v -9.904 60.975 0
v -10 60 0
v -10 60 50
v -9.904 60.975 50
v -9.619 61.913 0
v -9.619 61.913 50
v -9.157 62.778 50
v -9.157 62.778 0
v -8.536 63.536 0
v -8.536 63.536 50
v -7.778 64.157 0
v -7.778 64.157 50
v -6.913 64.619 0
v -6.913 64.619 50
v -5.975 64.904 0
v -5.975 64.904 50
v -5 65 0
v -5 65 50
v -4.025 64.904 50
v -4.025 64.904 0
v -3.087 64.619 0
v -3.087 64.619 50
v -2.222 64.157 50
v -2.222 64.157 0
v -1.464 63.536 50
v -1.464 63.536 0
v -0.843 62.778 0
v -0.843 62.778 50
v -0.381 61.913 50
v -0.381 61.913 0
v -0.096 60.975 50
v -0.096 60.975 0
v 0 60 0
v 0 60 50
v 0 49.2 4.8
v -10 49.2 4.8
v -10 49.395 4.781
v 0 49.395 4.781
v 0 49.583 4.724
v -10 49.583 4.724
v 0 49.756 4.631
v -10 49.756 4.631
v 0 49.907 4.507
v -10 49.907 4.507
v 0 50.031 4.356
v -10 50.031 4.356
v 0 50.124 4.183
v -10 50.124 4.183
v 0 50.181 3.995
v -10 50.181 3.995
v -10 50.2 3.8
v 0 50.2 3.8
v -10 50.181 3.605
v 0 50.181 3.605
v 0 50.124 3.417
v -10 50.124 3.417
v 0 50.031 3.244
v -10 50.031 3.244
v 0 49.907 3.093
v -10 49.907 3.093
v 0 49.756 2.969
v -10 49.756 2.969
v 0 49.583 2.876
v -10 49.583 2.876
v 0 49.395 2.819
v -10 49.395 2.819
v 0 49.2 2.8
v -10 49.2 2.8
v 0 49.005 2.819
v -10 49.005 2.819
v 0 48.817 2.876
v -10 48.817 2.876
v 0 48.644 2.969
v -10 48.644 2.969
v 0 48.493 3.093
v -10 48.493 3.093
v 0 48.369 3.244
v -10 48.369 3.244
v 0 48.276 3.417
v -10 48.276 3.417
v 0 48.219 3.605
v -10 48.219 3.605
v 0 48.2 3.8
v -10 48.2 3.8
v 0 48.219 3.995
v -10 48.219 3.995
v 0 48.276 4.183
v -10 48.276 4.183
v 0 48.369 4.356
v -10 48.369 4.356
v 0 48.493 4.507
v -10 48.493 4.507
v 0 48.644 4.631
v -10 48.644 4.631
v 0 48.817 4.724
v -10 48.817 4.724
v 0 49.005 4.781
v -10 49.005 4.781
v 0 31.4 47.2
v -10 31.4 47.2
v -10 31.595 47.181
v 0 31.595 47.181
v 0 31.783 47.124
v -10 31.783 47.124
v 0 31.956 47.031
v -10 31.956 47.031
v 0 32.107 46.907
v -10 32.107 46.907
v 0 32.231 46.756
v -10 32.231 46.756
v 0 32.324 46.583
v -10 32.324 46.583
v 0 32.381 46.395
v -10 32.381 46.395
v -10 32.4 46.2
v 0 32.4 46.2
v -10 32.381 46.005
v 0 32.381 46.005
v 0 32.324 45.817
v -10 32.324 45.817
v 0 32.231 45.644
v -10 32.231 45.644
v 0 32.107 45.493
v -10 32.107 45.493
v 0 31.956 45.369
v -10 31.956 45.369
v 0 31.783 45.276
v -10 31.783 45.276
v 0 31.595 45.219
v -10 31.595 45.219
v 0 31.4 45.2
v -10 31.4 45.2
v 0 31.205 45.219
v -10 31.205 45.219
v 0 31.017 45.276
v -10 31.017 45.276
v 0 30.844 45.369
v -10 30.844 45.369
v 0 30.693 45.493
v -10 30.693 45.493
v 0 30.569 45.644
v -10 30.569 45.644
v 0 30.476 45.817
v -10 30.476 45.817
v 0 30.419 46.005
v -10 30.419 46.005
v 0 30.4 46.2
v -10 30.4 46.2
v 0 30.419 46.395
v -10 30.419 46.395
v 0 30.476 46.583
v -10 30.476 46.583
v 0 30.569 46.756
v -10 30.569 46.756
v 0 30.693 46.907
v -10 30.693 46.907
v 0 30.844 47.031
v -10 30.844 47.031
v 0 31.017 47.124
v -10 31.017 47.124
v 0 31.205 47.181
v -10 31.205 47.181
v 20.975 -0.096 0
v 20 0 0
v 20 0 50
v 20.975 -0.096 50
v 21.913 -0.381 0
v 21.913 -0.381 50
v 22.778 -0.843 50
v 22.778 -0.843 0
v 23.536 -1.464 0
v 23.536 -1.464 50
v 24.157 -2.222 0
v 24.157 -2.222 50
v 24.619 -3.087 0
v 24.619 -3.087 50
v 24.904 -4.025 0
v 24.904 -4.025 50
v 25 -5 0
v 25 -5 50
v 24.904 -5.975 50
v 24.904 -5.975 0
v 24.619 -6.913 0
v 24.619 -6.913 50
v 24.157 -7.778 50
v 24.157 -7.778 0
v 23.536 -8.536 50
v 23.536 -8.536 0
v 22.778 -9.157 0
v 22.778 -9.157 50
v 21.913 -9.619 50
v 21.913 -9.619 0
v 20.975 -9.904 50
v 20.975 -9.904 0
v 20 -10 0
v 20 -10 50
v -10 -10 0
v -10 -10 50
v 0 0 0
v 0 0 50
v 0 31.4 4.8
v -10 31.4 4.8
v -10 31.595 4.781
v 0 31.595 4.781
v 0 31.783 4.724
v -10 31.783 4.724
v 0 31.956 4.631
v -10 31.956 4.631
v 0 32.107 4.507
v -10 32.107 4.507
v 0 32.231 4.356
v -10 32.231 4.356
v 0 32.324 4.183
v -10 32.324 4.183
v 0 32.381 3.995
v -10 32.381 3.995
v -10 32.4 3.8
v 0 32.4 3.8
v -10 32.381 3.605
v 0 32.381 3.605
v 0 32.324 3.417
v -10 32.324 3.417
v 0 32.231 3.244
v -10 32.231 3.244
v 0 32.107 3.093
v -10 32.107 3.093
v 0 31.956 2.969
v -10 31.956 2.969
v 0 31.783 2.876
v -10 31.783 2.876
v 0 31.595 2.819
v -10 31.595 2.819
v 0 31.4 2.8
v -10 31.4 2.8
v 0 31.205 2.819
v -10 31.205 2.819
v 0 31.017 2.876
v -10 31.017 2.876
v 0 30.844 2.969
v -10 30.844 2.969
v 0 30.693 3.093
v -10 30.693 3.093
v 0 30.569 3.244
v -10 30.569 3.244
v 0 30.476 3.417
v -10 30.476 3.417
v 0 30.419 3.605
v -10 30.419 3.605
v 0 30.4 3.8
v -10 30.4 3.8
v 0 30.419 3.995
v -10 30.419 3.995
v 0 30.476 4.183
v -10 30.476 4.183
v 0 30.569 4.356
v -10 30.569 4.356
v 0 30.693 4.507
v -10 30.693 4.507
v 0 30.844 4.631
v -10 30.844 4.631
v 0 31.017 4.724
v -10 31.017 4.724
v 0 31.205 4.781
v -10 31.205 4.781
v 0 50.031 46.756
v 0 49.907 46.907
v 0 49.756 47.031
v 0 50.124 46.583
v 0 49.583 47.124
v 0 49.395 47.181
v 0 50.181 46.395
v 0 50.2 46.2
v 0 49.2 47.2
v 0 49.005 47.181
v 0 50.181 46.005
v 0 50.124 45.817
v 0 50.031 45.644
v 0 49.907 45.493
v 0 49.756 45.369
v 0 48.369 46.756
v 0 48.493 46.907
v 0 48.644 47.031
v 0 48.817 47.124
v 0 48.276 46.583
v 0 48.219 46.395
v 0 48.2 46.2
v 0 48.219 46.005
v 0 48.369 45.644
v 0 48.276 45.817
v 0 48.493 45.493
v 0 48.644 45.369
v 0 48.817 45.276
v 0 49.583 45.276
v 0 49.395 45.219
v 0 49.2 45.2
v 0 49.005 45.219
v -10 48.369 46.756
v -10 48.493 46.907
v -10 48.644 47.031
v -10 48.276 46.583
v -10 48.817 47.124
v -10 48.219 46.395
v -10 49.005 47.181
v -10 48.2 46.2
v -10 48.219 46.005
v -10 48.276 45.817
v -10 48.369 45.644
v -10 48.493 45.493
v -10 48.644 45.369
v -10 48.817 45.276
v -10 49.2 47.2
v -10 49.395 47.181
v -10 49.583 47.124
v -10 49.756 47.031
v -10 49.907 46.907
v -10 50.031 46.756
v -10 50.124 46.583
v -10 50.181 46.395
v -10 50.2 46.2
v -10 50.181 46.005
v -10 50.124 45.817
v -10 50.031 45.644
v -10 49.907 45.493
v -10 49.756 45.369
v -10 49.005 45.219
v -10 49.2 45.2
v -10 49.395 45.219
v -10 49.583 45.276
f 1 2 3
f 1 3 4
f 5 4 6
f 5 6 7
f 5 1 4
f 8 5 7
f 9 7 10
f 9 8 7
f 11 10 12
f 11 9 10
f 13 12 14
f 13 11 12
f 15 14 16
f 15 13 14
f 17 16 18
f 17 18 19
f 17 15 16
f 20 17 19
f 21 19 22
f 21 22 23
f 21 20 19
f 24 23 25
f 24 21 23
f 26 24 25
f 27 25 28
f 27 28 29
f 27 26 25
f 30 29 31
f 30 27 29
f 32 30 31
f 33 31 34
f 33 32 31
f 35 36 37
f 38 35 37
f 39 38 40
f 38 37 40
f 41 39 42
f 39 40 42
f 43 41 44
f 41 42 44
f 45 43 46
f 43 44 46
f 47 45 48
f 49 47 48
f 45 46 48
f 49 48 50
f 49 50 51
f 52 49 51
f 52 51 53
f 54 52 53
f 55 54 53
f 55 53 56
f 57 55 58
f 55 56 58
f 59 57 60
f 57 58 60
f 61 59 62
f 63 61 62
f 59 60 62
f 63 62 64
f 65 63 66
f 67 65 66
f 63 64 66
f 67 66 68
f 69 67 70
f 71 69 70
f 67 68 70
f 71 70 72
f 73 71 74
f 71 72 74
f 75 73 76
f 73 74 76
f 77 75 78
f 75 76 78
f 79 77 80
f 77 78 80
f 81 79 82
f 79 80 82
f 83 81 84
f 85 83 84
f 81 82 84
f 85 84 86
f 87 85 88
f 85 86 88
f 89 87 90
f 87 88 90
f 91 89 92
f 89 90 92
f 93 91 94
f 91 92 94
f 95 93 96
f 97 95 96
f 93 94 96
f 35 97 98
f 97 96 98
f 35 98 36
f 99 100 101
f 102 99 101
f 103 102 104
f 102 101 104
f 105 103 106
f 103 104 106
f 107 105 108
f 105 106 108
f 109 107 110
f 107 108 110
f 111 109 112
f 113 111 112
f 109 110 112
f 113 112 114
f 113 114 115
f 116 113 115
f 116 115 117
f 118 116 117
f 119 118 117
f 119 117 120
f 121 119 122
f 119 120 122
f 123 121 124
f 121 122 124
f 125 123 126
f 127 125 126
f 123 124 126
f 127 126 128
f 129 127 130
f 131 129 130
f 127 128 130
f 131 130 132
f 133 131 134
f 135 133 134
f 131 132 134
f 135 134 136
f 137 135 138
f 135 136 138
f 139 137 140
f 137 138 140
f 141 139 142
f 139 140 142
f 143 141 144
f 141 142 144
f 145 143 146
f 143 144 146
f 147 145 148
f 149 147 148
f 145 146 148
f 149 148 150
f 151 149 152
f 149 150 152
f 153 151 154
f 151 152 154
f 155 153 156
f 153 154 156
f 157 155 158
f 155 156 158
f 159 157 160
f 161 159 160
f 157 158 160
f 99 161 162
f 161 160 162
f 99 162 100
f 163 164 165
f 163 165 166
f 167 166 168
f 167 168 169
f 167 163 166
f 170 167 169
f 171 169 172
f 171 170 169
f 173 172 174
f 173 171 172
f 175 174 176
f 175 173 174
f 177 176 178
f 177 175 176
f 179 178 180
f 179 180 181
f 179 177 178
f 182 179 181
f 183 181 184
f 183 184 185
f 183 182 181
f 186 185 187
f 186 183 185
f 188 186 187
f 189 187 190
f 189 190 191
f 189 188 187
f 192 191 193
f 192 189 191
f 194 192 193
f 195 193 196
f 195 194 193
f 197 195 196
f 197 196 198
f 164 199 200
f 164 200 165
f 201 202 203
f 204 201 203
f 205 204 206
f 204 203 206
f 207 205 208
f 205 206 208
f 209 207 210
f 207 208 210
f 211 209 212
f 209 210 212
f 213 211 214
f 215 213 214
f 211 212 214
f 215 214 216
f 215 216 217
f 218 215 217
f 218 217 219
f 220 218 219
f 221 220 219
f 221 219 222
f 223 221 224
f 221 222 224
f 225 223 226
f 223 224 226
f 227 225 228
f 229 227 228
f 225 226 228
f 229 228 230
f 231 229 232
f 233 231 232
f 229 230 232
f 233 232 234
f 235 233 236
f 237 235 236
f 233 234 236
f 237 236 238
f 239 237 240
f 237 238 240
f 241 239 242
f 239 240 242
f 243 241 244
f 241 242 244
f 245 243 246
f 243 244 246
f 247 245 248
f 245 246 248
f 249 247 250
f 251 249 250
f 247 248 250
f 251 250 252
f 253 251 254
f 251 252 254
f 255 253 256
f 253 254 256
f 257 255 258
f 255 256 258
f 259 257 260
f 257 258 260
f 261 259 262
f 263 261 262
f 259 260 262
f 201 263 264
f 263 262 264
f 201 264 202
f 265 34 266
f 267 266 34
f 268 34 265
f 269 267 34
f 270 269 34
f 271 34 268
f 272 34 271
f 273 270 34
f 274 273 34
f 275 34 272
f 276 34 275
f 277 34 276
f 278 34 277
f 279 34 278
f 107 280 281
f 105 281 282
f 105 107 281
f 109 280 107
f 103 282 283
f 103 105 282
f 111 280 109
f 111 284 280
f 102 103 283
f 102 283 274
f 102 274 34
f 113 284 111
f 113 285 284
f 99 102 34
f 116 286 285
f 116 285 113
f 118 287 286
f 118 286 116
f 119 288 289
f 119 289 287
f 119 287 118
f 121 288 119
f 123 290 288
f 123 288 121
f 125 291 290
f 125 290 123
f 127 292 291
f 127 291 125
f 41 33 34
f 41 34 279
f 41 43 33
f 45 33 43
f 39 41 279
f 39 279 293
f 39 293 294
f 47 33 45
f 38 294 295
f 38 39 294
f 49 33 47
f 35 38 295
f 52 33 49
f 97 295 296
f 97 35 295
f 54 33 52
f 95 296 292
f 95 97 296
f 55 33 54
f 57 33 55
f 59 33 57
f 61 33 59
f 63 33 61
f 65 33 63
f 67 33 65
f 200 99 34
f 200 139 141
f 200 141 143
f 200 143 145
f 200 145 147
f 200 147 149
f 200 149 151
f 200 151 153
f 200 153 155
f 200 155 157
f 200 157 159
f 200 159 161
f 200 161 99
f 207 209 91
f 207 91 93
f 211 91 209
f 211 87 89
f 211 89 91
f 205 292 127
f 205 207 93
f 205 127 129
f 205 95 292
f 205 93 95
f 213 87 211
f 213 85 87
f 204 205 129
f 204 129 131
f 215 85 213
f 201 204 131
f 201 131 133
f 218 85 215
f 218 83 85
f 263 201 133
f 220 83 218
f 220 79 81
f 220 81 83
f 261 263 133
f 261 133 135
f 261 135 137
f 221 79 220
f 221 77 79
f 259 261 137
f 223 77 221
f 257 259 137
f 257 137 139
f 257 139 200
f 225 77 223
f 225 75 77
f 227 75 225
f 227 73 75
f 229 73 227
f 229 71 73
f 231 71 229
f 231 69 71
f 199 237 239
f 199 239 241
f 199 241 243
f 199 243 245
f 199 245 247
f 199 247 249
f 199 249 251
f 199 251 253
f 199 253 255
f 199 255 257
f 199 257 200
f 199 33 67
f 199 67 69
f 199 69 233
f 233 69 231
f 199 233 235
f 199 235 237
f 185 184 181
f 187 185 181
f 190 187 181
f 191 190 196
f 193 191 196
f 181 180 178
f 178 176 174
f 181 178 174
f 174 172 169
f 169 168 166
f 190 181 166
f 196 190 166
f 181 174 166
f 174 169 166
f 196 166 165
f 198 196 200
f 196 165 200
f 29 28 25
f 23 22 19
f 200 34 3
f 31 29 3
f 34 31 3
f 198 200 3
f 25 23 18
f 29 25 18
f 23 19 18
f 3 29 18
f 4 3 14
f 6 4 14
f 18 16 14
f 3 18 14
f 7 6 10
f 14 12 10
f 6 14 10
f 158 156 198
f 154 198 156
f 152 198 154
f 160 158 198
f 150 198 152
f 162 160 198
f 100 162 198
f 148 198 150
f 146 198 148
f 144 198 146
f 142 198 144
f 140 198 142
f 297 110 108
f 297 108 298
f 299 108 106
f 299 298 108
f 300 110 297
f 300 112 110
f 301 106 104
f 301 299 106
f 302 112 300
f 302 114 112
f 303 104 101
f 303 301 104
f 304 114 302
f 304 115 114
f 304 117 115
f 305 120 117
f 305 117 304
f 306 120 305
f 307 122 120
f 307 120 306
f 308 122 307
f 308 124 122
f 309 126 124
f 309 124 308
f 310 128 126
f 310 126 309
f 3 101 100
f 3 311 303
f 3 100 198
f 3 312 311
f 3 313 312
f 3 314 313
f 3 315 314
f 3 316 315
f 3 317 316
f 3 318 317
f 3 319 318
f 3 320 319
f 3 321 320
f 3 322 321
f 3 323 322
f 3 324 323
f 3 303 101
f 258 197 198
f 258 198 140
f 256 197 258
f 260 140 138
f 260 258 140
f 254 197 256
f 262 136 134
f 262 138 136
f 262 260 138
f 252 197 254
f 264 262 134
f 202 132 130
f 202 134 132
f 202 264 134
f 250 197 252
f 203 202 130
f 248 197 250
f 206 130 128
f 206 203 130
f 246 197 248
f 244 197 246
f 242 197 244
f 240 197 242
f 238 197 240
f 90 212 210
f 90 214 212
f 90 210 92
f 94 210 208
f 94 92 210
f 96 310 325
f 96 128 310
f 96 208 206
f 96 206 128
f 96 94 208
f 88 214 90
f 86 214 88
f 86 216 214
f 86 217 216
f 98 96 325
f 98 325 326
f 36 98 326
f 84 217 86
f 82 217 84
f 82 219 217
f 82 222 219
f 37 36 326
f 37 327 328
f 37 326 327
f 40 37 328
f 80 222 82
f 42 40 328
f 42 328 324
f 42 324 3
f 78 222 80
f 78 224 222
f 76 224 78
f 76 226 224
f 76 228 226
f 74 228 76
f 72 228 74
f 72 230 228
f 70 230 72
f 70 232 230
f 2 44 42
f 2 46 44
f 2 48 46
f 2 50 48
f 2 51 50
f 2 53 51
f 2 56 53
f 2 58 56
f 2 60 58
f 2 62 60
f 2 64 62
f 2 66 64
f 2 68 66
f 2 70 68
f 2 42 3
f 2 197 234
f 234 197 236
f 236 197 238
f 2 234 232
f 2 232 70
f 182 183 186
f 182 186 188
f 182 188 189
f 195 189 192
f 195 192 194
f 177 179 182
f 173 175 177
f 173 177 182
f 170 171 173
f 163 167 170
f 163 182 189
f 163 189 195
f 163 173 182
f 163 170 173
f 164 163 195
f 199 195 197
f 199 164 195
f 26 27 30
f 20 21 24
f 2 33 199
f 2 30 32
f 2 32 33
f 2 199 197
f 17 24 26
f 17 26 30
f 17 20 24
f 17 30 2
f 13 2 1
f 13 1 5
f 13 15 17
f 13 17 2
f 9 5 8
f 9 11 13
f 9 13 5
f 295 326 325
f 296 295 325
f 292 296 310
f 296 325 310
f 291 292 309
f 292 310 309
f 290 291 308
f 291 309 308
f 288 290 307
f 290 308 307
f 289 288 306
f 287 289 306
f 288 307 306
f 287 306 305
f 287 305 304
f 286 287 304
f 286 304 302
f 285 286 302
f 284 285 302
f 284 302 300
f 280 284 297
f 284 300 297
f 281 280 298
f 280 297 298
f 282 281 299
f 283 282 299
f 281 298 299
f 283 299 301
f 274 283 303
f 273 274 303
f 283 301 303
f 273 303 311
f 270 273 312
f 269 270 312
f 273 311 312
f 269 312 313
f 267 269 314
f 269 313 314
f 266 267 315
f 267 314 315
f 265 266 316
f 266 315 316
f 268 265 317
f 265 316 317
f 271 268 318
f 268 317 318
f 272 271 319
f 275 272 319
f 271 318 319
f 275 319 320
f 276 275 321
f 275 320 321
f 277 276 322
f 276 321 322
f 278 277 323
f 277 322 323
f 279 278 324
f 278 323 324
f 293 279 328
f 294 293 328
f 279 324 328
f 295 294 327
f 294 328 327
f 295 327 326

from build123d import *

# Parameters (mm, degrees)
BOSS_EXTRUDE1_DEPTH = 50
SKETCH2_R           = 1
CUT_EXTRUDE1_DEPTH  = 10


with BuildPart() as part:
    # Sketch1 → Boss-Extrude1 (new body)
    with BuildSketch(Plane.XY):
        with BuildLine():
            Line((0, 60), (0, 0))
            Line((0, 0), (20, 0))
            ThreePointArc((20, 0), (25, -5), (20, -10))
            Line((20, -10), (-10, -10))
            Line((-10, -10), (-10, 60))
            ThreePointArc((-10, 60), (-5, 65), (0, 60))
        make_face()
    extrude(amount=BOSS_EXTRUDE1_DEPTH)

    # Sketch2 → Cut-Extrude1 (cut)
    with BuildSketch(Plane.ZY.offset(10)):
        with Locations((3.8, 31.4)):
            Circle(SKETCH2_R)
        with Locations((3.8, 49.2)):
            Circle(SKETCH2_R)
        with Locations((46.2, 31.4)):
            Circle(SKETCH2_R)
        with Locations((46.2, 49.2)):
            Circle(SKETCH2_R)
    extrude(amount=-CUT_EXTRUDE1_DEPTH, mode=Mode.SUBTRACT)


solid = part.part
